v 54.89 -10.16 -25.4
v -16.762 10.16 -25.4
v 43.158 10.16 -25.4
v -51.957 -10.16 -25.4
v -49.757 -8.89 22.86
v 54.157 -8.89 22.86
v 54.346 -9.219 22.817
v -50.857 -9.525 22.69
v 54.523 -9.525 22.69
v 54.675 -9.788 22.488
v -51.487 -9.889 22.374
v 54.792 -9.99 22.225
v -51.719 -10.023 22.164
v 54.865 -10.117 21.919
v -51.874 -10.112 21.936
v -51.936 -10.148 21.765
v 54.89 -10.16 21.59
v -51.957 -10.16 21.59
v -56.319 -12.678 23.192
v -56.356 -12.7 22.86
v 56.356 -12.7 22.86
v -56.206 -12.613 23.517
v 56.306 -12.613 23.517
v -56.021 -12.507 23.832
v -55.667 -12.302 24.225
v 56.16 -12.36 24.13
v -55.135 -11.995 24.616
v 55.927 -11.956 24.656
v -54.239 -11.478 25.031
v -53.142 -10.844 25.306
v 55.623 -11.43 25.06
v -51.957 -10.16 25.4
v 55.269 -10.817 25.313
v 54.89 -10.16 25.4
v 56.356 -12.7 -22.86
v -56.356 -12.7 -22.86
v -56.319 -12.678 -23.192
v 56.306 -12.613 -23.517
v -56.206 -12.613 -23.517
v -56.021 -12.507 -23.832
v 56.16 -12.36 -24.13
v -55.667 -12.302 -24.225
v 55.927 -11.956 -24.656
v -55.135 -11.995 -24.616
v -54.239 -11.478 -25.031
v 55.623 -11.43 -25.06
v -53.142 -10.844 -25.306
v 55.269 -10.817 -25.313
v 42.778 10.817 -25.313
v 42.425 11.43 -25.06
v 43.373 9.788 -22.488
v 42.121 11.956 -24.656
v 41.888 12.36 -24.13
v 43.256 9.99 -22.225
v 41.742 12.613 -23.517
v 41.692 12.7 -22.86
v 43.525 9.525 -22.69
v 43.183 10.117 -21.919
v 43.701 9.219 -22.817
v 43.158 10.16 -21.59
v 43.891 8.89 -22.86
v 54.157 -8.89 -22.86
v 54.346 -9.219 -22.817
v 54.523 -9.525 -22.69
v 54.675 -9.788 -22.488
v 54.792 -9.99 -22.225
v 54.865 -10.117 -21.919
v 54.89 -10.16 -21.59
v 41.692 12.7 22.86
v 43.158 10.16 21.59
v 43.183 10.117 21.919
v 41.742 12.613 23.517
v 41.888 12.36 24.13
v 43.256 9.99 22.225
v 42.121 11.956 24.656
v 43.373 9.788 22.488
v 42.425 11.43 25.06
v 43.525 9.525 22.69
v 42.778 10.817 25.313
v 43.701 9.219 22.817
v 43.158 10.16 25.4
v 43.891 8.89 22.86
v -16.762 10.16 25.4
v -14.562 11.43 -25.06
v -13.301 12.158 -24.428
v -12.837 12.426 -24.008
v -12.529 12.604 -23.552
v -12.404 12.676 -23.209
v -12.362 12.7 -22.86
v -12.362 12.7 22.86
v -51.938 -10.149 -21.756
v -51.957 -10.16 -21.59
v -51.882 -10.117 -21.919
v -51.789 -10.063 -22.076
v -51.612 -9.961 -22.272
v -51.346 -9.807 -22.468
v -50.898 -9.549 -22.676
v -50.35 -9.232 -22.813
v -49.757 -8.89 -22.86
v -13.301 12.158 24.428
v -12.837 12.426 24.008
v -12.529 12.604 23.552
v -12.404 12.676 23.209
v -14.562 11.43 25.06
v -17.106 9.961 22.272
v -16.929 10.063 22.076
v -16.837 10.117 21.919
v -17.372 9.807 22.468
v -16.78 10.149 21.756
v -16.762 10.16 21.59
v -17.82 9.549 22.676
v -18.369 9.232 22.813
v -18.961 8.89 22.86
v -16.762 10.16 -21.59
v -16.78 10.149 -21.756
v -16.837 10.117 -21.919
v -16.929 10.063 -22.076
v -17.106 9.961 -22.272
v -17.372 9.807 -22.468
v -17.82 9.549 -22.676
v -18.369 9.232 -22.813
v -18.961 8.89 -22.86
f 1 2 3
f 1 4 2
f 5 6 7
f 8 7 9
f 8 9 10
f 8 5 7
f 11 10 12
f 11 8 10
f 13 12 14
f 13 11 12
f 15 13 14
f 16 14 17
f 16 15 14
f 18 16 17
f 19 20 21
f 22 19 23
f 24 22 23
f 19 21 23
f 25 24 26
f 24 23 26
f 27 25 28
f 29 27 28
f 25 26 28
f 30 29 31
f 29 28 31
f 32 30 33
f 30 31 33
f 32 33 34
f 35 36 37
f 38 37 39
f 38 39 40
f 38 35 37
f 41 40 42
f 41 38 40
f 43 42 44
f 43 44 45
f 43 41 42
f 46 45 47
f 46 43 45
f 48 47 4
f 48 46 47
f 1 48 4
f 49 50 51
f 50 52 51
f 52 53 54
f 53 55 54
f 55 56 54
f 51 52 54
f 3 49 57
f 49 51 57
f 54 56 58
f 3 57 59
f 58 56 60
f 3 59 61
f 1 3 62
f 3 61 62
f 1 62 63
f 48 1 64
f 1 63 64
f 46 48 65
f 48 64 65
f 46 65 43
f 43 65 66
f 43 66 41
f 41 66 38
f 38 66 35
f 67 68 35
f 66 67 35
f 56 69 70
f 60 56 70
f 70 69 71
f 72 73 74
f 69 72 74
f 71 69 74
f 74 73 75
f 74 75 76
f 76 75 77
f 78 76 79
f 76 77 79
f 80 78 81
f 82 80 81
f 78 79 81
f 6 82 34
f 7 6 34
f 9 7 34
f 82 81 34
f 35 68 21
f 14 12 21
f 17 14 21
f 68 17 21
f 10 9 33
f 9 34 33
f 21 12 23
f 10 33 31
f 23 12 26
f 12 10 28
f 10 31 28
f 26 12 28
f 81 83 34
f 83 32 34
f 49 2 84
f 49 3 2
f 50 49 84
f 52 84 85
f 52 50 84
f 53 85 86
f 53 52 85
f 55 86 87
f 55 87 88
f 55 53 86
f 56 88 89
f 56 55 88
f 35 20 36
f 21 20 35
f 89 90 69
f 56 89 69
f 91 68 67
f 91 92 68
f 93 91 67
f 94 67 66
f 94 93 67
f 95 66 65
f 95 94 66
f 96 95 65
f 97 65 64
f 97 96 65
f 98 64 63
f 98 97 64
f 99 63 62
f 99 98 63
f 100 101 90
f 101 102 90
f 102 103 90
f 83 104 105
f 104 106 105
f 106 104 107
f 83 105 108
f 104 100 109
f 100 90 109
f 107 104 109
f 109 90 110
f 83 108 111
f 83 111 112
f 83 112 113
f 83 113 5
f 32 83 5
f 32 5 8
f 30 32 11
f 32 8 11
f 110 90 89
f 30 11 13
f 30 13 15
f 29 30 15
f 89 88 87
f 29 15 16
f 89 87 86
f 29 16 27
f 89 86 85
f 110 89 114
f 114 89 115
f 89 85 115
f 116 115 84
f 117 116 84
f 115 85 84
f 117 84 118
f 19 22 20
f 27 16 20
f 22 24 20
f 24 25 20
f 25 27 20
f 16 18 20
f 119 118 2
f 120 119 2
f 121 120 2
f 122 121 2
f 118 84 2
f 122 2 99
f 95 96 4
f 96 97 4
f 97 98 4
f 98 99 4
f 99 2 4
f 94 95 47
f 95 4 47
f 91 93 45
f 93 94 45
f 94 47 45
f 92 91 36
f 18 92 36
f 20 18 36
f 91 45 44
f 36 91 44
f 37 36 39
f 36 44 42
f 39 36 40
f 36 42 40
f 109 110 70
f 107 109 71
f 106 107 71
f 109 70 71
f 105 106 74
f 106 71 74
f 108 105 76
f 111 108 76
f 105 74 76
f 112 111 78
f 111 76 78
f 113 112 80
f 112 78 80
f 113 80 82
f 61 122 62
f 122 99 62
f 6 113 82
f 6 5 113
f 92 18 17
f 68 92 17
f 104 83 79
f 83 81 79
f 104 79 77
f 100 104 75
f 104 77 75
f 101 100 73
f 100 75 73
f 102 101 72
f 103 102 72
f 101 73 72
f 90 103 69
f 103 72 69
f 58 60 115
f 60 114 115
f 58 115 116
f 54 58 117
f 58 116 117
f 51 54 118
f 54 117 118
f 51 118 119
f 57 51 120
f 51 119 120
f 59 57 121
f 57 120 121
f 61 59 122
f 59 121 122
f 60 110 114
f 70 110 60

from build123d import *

# Parameters (mm, degrees)
F0_W     = 112.7125
F0_H     = 50.8
F1_DEPTH = 12.7
F2_T     = -2.54
F4_DEPTH = 50.801
F6_DEPTH = 50.801
F7_R     = 2.54
F8_R     = 1.27


with BuildPart() as f1:
    # F0 (on Front) → F1 (new body, symmetric)
    with BuildSketch(Plane.XZ):
        Rectangle(F0_W, F0_H)
    extrude(amount=F1_DEPTH, both=True)

    # F2
    f2_openings = [f1.faces().sort_by_distance(p)[0] for p in [
        (-56.35625, 0, 0),
        (56.35625, 0, 0),
    ]]
    offset(amount=F2_T, openings=f2_openings)

    # F3 (on face) → F4 (cut, through all)
    with BuildSketch(Plane(origin=(0, 0, -25.4), x_dir=(1, 0, 0), z_dir=(0, 0, -1))):
        Polygon((-12.3621594878, -12.7), (-56.35625, 12.7), (-56.35625, -12.7), align=None)
    extrude(amount=-F4_DEPTH, mode=Mode.SUBTRACT)

    # F5 (on face) → F6 (cut, through all)
    with BuildSketch(Plane.XY.offset(25.4)):
        Polygon((41.6915531626, 12.7), (56.35625, -12.7), (56.35625, 12.7), align=None)
    extrude(amount=-F6_DEPTH, mode=Mode.SUBTRACT)

    # F7
    f7_edges = [f1.edges().sort_by_distance(p)[0] for p in [
        (0, -12.7, 25.4),
        (14.664697, 12.7, 25.4),
        (14.664697, 12.7, -25.4),
        (0, -12.7, -25.4),
    ]]
    fillet(f7_edges, radius=F7_R)

    # F8
    f8_edges = [f1.edges().sort_by_distance(p)[0] for p in [
        (13.198227, 10.16, 22.86),
        (1.46647, -10.16, 22.86),
        (1.46647, -10.16, -22.86),
        (13.198227, 10.16, -22.86),
    ]]
    fillet(f8_edges, radius=F8_R)


solid = f1.part
